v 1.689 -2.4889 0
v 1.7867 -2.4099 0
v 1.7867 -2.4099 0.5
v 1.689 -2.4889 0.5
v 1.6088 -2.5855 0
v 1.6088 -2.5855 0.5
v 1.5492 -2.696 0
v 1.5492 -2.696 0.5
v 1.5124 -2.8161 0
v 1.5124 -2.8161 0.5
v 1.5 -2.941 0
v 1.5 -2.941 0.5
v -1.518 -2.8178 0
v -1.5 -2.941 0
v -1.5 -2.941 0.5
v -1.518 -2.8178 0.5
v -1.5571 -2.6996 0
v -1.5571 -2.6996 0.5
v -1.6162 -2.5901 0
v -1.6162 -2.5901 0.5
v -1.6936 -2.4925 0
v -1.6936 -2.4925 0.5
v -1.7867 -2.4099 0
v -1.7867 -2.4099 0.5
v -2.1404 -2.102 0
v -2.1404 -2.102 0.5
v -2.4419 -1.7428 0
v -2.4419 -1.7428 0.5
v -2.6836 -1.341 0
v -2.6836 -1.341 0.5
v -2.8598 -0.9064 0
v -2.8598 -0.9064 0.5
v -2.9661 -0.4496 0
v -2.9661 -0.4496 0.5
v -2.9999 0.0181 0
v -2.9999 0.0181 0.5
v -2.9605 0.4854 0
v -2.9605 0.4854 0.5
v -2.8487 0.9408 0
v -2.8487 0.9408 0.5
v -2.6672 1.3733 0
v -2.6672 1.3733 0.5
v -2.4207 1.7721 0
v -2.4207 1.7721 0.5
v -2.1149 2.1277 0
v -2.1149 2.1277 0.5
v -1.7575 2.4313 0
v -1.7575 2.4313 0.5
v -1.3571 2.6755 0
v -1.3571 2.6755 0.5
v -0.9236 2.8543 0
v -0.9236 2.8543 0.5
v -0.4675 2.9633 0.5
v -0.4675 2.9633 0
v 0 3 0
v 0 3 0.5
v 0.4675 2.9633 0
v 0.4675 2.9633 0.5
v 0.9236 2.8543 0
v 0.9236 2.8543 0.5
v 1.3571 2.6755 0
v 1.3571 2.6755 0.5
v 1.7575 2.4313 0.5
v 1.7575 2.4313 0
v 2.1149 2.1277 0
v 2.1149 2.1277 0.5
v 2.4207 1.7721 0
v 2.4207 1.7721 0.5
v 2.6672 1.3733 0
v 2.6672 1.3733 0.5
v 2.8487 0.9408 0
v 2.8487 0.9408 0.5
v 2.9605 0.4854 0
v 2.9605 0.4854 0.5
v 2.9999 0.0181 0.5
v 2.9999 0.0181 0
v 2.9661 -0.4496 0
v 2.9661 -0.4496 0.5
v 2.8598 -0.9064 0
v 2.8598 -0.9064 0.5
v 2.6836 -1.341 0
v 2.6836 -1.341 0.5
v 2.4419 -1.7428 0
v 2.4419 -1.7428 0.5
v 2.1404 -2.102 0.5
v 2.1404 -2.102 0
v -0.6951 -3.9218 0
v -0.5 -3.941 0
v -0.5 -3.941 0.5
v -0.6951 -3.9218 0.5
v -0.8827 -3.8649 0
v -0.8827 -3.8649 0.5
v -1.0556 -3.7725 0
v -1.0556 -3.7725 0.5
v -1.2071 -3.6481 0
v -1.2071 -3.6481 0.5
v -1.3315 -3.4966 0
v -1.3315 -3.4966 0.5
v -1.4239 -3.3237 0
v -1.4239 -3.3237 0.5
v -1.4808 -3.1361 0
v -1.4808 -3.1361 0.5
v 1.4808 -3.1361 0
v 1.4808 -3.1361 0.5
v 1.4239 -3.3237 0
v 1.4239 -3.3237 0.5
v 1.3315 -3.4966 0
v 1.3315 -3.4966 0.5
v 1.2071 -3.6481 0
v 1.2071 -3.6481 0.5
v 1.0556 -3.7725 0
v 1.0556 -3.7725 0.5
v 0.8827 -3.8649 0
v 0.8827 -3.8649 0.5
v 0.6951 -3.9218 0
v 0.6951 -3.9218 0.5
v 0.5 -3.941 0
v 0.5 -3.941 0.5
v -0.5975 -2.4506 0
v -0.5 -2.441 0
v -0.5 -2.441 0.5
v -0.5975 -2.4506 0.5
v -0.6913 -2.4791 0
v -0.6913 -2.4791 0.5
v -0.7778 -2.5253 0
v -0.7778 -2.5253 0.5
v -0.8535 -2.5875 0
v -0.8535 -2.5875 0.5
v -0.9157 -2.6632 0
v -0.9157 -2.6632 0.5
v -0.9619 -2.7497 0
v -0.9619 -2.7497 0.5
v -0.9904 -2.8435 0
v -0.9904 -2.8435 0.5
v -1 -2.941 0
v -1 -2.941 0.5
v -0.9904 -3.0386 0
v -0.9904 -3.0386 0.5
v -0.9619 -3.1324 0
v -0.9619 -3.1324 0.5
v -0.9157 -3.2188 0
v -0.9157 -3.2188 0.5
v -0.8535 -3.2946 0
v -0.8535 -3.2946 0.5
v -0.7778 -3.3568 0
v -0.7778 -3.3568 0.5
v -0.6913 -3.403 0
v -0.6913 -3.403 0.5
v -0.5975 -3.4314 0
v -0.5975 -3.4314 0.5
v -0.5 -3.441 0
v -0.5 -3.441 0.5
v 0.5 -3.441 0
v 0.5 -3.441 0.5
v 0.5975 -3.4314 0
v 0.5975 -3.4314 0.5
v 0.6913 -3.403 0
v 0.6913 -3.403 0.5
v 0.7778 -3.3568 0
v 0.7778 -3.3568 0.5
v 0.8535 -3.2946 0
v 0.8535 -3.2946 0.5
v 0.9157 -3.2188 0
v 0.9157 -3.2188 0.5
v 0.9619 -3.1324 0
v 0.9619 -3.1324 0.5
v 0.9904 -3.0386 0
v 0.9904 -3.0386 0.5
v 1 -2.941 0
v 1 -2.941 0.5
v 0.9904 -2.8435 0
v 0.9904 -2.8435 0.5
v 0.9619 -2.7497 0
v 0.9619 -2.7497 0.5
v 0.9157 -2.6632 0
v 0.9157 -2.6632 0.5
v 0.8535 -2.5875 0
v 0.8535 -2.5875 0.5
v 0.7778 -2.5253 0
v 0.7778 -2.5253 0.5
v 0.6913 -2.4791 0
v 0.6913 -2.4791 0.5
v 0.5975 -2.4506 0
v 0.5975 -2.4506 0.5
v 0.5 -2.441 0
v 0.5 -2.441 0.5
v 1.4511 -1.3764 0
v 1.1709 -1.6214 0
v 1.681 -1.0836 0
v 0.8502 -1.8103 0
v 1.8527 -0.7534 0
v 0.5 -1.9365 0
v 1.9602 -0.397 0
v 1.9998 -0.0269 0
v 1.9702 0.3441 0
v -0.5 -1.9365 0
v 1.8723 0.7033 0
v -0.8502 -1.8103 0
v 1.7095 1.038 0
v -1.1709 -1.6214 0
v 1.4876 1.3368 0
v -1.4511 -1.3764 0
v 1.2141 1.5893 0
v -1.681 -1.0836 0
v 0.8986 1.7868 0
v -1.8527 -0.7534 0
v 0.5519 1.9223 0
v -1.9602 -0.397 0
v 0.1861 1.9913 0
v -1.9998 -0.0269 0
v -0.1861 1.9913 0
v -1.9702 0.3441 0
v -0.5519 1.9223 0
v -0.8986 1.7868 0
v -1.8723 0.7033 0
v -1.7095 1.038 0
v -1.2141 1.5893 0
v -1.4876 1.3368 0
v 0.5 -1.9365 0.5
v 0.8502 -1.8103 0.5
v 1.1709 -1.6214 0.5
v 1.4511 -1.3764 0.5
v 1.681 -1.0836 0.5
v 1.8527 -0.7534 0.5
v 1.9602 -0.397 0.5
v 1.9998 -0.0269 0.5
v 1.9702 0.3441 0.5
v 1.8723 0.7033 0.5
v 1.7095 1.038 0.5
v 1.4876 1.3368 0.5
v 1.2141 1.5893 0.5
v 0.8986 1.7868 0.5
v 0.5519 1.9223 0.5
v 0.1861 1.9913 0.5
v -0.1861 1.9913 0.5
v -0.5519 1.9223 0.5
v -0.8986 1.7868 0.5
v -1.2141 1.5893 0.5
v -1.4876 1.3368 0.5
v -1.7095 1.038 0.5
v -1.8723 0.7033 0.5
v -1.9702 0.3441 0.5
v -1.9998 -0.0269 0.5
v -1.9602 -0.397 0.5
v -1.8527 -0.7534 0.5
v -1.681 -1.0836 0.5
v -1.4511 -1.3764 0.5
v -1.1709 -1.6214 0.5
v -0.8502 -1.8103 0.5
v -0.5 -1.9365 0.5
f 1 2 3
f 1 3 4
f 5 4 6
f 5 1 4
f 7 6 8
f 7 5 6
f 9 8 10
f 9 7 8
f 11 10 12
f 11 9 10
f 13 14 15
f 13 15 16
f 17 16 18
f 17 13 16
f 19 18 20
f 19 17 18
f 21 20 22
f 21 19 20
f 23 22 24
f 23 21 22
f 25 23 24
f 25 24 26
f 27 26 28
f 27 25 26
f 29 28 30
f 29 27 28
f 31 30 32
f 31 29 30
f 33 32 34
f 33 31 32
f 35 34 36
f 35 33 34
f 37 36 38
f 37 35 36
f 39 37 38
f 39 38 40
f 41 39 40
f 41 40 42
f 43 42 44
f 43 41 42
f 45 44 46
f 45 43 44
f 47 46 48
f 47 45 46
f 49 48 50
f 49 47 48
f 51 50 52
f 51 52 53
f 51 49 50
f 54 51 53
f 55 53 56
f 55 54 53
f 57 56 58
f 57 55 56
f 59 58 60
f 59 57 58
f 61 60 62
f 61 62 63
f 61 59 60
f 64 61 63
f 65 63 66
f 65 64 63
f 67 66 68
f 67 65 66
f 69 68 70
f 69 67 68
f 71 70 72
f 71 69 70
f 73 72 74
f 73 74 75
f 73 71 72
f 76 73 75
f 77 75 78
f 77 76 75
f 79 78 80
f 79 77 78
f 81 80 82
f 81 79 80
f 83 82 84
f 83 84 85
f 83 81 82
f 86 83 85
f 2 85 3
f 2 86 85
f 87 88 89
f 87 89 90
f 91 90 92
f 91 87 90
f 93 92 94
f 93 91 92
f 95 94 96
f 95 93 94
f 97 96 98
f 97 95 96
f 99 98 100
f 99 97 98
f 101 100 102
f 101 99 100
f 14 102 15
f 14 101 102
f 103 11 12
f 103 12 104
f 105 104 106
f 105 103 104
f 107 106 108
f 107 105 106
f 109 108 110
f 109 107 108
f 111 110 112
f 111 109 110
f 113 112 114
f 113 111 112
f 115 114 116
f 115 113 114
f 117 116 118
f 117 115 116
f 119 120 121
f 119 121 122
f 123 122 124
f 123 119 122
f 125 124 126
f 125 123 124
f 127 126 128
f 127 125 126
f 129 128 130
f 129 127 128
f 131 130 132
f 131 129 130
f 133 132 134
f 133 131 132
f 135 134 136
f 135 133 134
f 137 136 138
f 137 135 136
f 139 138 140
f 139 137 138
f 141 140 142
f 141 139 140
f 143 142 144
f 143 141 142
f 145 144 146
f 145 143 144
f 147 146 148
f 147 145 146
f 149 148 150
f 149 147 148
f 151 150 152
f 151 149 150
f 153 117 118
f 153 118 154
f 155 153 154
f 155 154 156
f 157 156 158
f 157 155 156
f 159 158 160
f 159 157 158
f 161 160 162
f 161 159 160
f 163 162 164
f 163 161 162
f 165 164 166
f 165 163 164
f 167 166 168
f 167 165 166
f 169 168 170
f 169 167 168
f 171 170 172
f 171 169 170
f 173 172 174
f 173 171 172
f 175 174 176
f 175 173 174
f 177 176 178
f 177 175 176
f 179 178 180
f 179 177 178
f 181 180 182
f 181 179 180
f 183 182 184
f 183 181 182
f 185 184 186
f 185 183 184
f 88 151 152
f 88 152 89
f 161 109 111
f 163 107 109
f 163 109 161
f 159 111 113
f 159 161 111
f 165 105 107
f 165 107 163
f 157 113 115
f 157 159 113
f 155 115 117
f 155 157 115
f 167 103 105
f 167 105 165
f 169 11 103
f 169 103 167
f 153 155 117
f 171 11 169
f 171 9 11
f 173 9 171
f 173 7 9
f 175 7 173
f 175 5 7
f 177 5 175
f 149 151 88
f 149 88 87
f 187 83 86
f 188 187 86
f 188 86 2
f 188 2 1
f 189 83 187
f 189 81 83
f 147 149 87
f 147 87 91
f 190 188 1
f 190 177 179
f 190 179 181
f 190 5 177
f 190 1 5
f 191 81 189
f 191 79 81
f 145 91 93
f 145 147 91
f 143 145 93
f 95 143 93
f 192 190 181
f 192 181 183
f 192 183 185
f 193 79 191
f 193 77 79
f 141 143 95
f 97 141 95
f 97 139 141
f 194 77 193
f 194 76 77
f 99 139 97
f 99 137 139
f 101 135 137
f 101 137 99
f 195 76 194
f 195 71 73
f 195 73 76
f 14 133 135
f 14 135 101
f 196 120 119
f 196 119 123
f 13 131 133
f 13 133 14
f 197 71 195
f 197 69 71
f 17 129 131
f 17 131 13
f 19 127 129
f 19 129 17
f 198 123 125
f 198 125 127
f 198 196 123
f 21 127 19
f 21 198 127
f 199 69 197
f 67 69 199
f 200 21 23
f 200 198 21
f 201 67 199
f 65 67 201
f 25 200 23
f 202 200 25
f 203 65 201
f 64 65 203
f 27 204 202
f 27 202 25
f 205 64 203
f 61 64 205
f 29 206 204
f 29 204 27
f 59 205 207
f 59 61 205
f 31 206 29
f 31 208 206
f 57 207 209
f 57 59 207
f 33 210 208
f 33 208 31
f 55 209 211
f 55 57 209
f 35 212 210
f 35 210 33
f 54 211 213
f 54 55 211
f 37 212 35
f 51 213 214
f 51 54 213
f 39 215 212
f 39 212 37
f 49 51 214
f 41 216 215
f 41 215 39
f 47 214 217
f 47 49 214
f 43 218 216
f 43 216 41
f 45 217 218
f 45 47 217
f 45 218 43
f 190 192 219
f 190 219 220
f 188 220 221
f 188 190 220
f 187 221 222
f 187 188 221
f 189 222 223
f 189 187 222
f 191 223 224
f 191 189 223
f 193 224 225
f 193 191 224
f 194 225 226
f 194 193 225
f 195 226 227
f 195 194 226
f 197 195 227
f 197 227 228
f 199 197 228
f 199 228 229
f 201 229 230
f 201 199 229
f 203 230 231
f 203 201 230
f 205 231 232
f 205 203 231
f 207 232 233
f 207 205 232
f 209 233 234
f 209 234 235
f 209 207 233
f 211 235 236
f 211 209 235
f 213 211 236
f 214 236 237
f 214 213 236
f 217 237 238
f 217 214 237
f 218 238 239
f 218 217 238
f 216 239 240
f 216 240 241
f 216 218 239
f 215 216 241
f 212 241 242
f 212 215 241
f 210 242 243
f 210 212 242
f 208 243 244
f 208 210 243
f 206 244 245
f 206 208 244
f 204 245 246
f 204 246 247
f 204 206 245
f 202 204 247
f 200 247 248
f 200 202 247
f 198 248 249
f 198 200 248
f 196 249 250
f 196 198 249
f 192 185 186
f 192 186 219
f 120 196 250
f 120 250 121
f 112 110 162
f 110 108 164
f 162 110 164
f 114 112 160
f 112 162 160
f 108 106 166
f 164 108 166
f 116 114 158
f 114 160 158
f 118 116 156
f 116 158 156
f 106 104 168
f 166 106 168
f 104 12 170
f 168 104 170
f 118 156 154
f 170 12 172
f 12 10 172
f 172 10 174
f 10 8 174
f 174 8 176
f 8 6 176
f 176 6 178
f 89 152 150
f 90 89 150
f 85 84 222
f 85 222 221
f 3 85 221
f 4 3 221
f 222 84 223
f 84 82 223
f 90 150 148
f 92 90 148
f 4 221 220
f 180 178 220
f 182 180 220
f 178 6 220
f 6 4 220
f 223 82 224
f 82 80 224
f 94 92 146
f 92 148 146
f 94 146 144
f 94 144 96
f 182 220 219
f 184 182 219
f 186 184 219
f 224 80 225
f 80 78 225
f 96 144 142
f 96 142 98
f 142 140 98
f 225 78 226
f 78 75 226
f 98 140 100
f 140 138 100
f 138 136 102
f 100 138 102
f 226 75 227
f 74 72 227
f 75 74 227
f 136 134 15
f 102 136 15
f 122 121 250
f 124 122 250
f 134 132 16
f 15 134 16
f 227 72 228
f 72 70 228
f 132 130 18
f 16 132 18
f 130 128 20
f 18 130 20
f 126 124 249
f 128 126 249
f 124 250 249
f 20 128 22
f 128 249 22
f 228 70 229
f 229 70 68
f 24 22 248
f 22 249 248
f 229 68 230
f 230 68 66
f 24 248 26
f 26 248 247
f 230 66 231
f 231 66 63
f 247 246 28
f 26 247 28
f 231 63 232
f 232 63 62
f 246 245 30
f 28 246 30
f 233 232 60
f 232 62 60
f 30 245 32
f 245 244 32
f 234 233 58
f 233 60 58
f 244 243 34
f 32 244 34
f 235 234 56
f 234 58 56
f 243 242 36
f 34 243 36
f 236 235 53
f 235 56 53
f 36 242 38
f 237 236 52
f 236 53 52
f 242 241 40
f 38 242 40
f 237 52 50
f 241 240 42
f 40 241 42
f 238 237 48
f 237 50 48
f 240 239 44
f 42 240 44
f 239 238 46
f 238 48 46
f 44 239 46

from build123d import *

# Parameters (mm, degrees)
SALIENTE_EXTRUIR1_DEPTH = 0.5


with BuildPart() as part:
    # Croquis1 → Saliente-Extruir1 (new body)
    with BuildSketch(Plane.XY):
        with BuildLine():
            Line((0.499989722, -2.441025539), (0.499989722, -1.936491673))
            ThreePointArc((0.499989722, -1.936491673), (0, 1.999997431), (-0.499989722, -1.936491673))
            Line((-0.499989722, -1.936491673), (-0.499989722, -2.441025539))
            ThreePointArc((-0.499989722, -2.441025539), (-0.999989722, -2.941025539), (-0.499989722, -3.441025539))
            Line((-0.499989722, -3.441025539), (-0.499989722, -3.941025539))
            ThreePointArc((-0.499989722, -3.941025539), (-1.207103771, -3.64812931), (-1.5, -2.941015261))
            ThreePointArc((-1.5, -2.941015261), (-1.584275622, -2.64357108), (-1.786707813, -2.409911864))
            ThreePointArc((-1.786707813, -2.409911864), (0, 3), (1.786707813, -2.409911864))
            ThreePointArc((1.786707813, -2.409911864), (1.576253442, -2.639240432), (1.5, -2.941015261))
            ThreePointArc((1.5, -2.941015261), (1.207103771, -3.64812931), (0.499989722, -3.941025539))
            Line((0.499989722, -3.941025539), (0.499989722, -3.441025539))
            ThreePointArc((0.499989722, -3.441025539), (0.999989722, -2.941025539), (0.499989722, -2.441025539))
        make_face()
    extrude(amount=SALIENTE_EXTRUIR1_DEPTH)


solid = part.part
